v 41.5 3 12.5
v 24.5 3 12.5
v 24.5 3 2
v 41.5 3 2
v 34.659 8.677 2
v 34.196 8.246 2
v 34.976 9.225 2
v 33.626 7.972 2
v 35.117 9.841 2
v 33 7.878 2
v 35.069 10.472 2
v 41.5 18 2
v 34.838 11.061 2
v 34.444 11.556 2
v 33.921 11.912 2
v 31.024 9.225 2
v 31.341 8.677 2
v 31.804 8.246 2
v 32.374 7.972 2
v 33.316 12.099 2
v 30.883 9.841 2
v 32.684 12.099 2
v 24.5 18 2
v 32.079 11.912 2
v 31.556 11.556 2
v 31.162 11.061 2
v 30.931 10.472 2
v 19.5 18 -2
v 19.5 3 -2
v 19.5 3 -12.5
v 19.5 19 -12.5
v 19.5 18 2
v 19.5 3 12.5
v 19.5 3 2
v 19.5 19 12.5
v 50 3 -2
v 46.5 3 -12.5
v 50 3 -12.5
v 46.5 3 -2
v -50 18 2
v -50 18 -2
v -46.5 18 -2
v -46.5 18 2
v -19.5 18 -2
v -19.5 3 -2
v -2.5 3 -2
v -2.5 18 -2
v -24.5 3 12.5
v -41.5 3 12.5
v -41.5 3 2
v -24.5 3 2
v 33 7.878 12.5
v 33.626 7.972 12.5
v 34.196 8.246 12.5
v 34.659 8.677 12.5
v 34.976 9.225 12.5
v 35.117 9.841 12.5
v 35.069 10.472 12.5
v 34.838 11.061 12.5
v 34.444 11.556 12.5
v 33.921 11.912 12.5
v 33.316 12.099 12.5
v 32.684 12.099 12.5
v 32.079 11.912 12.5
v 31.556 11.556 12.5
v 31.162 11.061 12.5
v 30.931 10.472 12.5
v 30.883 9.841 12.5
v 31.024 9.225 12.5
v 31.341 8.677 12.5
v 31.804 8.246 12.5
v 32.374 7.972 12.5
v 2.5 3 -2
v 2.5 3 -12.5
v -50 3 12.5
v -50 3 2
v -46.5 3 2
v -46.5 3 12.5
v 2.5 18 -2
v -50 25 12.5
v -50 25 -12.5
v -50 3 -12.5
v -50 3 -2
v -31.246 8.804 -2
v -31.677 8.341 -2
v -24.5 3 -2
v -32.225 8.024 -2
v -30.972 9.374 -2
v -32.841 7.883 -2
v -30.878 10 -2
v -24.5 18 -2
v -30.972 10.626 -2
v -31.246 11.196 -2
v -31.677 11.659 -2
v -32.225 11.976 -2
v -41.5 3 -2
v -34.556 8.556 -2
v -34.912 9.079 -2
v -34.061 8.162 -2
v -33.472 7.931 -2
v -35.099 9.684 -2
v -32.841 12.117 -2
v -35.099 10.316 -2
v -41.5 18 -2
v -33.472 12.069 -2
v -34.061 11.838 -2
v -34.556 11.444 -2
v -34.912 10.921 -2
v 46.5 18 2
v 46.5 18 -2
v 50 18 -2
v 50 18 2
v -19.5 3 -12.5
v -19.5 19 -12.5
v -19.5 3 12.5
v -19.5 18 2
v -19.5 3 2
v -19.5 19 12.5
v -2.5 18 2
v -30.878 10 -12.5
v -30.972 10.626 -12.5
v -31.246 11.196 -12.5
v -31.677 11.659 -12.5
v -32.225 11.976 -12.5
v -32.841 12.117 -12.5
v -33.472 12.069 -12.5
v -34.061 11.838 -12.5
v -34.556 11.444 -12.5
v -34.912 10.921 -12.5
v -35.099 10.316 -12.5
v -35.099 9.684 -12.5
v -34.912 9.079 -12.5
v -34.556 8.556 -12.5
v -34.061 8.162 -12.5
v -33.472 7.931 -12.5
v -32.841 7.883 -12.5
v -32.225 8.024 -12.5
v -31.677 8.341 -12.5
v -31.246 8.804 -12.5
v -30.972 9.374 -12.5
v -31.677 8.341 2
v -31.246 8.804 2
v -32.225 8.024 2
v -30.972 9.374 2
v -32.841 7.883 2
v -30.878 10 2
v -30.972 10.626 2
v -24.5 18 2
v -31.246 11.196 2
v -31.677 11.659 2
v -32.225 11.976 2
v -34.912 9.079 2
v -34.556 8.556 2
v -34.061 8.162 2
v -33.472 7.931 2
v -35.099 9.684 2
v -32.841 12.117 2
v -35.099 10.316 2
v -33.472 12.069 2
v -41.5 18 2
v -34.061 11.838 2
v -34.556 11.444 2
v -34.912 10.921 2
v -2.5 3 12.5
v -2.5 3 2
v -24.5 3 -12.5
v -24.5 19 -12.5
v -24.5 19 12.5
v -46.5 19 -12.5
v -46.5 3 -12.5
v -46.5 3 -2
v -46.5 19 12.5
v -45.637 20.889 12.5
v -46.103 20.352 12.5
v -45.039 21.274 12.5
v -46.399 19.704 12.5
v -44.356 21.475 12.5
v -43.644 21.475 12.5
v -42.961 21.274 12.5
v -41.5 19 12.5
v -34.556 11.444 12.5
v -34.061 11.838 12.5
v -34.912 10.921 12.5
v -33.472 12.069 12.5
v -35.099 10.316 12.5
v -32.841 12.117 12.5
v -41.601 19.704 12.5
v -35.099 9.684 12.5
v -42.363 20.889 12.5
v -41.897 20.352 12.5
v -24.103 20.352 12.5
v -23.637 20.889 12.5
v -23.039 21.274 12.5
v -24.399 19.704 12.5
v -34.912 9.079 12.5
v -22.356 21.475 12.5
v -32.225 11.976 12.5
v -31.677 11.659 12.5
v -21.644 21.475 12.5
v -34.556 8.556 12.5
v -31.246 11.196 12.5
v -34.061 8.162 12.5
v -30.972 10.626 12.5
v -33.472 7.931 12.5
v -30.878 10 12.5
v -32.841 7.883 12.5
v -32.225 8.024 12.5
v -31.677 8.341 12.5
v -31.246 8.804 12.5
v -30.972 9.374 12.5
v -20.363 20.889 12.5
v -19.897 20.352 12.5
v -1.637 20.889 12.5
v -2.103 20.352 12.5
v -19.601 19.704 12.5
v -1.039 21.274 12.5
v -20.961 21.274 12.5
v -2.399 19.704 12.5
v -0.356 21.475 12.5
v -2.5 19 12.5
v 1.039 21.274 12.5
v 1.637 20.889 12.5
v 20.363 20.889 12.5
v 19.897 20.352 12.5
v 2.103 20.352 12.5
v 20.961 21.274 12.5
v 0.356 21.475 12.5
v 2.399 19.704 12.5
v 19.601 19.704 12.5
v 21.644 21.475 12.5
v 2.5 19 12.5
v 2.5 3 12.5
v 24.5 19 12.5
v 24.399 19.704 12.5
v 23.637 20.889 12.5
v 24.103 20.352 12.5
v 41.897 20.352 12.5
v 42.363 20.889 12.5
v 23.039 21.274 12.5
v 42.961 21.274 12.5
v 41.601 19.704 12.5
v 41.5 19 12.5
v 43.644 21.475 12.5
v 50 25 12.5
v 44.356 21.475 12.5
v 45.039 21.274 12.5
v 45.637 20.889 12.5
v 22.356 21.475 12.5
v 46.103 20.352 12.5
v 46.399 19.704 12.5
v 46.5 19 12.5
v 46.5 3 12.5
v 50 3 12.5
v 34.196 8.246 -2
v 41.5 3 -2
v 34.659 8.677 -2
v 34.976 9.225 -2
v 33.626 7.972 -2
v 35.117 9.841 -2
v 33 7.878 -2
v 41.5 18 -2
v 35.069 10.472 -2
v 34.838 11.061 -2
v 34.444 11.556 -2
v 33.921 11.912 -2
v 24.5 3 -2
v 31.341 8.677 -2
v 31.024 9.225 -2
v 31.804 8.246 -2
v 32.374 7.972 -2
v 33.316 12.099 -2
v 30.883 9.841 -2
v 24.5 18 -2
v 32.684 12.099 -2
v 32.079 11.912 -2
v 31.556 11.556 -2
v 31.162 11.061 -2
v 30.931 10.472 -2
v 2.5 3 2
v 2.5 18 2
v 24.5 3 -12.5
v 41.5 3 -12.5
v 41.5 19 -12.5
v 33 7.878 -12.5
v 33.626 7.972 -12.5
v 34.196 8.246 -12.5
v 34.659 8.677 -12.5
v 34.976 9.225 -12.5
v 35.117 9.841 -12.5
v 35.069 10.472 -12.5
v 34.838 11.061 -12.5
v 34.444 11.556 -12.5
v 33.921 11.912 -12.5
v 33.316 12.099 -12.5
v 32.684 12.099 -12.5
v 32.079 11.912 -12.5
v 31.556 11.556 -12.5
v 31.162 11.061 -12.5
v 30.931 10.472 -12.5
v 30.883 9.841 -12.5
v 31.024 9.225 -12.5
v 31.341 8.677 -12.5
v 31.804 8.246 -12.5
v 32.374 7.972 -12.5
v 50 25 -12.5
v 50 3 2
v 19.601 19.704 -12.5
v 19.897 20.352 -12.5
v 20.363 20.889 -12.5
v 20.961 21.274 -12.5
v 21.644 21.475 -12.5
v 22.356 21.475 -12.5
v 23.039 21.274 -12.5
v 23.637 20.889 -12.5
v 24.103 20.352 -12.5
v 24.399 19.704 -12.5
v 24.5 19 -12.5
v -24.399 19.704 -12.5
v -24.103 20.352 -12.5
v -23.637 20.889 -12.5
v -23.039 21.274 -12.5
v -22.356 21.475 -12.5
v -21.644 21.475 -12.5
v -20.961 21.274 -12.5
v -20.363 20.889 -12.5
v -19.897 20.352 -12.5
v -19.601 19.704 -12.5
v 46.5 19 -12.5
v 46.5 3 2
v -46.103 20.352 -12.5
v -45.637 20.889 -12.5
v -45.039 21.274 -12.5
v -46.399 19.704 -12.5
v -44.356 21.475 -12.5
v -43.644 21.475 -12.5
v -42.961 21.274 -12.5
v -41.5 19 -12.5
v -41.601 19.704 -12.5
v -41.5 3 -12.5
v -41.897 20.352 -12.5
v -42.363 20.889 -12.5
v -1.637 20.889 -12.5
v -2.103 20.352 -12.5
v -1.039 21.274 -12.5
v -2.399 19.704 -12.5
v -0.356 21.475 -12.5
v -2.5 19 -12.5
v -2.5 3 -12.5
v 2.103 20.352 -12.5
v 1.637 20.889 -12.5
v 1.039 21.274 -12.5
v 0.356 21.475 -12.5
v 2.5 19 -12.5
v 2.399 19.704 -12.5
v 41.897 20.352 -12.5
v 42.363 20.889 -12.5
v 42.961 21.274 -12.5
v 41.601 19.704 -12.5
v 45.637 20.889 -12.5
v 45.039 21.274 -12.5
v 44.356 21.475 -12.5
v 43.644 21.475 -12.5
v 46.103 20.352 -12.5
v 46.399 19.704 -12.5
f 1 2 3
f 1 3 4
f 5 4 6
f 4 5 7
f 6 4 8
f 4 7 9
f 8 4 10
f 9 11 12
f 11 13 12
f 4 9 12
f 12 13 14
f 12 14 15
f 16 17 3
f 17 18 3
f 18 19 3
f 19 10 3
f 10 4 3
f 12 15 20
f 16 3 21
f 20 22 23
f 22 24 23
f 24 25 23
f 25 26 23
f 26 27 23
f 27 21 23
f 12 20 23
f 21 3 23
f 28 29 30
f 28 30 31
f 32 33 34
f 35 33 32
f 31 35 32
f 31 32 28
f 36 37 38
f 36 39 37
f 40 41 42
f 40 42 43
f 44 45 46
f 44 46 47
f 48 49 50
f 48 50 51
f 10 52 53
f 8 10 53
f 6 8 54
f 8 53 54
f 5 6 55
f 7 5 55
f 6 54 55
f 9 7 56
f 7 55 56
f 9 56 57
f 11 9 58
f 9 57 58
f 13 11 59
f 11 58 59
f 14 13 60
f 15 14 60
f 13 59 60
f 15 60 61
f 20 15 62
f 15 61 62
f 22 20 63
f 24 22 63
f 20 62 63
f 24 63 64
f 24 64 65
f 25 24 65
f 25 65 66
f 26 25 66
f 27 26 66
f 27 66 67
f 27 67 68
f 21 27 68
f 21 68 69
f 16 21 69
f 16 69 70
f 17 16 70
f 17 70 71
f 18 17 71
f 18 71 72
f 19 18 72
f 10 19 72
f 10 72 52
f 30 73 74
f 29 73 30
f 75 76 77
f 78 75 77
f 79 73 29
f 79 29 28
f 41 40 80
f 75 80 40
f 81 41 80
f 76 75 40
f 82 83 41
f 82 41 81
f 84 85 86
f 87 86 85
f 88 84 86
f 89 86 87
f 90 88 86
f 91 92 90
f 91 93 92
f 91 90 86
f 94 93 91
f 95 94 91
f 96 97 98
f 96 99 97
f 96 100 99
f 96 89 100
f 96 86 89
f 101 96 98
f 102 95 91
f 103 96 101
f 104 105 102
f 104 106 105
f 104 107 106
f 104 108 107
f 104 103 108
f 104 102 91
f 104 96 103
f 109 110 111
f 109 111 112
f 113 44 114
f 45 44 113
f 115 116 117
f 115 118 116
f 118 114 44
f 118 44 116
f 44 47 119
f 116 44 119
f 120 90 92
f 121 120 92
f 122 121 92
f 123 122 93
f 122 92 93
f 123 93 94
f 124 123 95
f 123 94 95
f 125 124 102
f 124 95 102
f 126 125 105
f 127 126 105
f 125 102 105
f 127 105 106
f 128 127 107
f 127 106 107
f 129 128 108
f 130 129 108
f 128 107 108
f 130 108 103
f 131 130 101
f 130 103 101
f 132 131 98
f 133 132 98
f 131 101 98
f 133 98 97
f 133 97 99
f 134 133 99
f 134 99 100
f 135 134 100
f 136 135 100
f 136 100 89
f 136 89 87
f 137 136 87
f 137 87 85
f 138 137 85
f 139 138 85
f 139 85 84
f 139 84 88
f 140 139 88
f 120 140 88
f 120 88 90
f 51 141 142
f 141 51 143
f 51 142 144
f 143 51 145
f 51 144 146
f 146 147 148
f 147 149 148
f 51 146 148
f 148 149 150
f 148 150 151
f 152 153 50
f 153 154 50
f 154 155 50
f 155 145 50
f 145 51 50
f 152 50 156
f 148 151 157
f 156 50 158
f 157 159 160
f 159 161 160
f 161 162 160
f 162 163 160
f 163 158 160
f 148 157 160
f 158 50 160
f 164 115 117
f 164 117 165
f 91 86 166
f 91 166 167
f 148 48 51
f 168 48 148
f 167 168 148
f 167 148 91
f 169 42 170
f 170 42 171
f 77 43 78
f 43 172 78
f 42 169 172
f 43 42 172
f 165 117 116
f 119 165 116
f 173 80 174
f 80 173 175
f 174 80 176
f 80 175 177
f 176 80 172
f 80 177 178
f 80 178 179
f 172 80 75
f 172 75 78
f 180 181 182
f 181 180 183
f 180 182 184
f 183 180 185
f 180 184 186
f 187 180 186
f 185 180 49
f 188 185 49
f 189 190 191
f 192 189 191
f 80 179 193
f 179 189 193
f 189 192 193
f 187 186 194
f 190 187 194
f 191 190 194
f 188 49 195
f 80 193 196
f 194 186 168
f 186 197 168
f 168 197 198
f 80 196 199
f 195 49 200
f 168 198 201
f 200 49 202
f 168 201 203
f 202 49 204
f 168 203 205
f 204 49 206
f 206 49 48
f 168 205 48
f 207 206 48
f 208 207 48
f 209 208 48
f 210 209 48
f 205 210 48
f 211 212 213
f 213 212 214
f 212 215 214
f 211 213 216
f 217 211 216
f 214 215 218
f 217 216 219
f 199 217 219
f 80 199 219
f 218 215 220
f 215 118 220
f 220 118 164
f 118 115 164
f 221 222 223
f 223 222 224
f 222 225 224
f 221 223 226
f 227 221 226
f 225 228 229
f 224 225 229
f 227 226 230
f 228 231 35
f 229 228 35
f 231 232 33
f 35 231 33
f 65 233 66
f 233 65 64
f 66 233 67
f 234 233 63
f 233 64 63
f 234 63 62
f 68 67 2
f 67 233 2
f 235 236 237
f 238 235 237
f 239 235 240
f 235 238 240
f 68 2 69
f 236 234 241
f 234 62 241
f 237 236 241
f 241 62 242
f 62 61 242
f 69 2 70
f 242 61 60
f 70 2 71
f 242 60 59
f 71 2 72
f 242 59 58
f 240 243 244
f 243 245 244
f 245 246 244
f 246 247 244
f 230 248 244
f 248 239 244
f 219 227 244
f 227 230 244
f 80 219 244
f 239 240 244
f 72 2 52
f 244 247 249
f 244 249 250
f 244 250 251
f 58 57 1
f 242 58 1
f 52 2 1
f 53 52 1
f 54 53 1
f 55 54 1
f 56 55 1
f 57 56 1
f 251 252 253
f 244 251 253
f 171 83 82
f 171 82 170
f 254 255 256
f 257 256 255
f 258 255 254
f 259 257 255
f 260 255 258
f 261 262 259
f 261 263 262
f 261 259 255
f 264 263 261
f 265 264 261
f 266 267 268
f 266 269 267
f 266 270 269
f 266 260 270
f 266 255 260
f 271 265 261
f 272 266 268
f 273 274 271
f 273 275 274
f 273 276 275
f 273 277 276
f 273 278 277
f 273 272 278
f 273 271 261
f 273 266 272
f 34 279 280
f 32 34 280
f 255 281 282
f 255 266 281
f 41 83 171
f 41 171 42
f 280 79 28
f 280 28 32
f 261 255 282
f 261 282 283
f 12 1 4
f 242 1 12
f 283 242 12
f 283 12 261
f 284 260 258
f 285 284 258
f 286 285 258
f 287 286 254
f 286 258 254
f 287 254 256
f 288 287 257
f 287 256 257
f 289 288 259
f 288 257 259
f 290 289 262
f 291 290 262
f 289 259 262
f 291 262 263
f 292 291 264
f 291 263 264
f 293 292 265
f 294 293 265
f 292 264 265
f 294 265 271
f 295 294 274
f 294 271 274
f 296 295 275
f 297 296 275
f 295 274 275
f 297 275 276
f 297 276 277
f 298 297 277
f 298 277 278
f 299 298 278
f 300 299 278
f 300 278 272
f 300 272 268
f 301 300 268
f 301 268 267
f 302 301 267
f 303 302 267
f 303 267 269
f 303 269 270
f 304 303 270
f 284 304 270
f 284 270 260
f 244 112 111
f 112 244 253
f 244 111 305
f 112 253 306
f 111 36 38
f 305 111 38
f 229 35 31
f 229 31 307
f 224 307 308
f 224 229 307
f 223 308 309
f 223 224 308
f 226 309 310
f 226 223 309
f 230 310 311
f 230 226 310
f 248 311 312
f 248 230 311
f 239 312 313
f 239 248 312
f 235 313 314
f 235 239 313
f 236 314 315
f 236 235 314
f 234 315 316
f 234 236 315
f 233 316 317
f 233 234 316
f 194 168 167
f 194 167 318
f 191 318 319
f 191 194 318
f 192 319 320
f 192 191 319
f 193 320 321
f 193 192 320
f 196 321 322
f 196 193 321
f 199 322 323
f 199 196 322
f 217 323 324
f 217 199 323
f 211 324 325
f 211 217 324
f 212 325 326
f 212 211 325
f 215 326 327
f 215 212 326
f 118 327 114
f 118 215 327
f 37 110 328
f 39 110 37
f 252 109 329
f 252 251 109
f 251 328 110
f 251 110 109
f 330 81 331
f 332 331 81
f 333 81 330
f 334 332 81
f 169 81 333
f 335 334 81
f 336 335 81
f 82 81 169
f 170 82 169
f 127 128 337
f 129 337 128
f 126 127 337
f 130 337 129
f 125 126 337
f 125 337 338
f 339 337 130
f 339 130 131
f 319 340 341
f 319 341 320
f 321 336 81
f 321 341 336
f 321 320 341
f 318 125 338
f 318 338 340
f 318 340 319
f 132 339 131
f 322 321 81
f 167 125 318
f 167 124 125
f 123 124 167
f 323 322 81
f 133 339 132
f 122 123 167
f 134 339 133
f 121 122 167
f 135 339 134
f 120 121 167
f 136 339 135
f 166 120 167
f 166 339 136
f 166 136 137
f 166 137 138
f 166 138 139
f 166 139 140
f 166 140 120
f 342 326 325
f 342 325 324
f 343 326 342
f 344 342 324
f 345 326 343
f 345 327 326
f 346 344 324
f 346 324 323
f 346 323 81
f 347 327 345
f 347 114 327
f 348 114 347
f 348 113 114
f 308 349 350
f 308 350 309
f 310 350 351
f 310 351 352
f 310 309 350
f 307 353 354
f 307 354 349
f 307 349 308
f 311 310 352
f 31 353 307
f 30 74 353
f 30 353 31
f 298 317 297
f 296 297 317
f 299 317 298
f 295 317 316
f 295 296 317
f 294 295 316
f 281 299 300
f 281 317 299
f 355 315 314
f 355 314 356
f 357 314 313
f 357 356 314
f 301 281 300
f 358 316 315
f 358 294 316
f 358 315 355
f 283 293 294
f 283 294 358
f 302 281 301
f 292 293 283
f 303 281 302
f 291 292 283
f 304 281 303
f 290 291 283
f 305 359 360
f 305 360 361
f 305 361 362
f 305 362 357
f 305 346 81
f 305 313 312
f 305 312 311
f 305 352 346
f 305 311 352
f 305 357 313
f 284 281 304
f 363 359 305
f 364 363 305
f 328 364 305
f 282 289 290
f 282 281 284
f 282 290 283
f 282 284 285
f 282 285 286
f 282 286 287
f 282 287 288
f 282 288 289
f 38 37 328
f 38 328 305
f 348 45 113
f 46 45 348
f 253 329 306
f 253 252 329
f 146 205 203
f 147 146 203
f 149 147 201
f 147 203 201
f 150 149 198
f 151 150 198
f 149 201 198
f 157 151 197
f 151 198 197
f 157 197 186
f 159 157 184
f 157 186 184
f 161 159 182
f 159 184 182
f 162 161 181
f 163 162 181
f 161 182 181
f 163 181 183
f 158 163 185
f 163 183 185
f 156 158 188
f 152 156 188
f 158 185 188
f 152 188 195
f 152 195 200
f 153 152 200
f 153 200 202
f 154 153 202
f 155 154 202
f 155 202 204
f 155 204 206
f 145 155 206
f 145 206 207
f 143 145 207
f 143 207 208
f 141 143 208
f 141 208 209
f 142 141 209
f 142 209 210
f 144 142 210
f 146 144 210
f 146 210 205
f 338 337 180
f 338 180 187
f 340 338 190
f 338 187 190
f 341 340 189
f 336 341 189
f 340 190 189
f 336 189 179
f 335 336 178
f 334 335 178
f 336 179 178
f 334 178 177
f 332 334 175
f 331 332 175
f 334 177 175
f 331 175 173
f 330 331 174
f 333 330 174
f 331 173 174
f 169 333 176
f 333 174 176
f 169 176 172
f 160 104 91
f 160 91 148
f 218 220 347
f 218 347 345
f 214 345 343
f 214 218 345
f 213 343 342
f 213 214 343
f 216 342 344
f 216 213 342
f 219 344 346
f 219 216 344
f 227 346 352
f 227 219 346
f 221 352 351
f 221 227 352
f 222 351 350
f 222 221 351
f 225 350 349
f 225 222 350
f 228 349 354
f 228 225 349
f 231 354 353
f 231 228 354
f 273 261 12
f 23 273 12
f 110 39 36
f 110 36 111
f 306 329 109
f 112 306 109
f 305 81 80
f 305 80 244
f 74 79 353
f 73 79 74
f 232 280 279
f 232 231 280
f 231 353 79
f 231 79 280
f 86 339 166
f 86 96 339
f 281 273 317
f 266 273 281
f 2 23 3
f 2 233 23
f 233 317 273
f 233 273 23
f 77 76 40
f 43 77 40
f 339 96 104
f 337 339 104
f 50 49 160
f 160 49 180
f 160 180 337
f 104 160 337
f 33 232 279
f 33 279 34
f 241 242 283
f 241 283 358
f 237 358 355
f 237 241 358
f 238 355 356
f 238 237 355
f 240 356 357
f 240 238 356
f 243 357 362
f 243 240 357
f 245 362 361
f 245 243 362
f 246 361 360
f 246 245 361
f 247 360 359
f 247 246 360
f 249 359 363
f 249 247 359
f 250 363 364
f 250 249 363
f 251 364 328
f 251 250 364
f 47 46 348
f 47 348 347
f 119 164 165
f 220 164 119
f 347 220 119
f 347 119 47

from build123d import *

# Parameters (mm, degrees)
SKETCH1_W           = 100
SKETCH1_H           = 25
BOSS_EXTRUDE1_DEPTH = 25
CUT_EXTRUDE1_DEPTH  = 48
SKETCH3_W           = 4
SKETCH3_H           = 18
CUT_EXTRUDE2_DEPTH  = 104.832798286
SKETCH4_R           = 2.122448424
CUT_EXTRUDE3_DEPTH  = 62.23724357
SKETCH5_W           = 100
SKETCH5_H           = 3
CUT_EXTRUDE4_DEPTH  = 62.23724357


with BuildPart() as part:
    # Sketch1 → Boss-Extrude1 (new body)
    with BuildSketch(Plane(origin=(0, 0, 0), x_dir=(1, 0, 0), z_dir=(0, 1, 0))):
        Rectangle(SKETCH1_W, SKETCH1_H)
    extrude(amount=BOSS_EXTRUDE1_DEPTH)

    # Sketch2 → Cut-Extrude1 (cut)
    with BuildSketch(Plane.XY.offset(12.5)):
        with BuildLine():
            Line((-19.5, 19), (-19.5, 0))
            Line((-19.5, 0), (-24.5, 0))
            Line((-24.5, 0), (-24.5, 19))
            ThreePointArc((-24.5, 19), (-22, 21.5), (-19.5, 19))
        make_face()
        with BuildLine():
            Line((-46.5, 19), (-46.5, 0))
            Line((-46.5, 0), (-41.5, 0))
            Line((-41.5, 0), (-41.5, 19))
            ThreePointArc((-41.5, 19), (-44, 21.5), (-46.5, 19))
        make_face()
        with BuildLine():
            Line((2.5, 19), (2.5, 0))
            Line((2.5, 0), (-2.5, 0))
            Line((-2.5, 0), (-2.5, 19))
            ThreePointArc((-2.5, 19), (0, 21.5), (2.5, 19))
        make_face()
        with BuildLine():
            Line((24.5, 19), (24.5, 0))
            Line((24.5, 0), (19.5, 0))
            Line((19.5, 0), (19.5, 19))
            ThreePointArc((19.5, 19), (22, 21.5), (24.5, 19))
        make_face()
        with BuildLine():
            Line((46.5, 19), (46.5, 0))
            Line((46.5, 0), (41.5, 0))
            Line((41.5, 0), (41.5, 19))
            ThreePointArc((41.5, 19), (44, 21.5), (46.5, 19))
        make_face()
    extrude(amount=-CUT_EXTRUDE1_DEPTH, mode=Mode.SUBTRACT)

    # Sketch3 → Cut-Extrude2 (cut, through all)
    with BuildSketch(Plane.ZY.offset(50)):
        with Locations((0, 9)):
            Rectangle(SKETCH3_W, SKETCH3_H)
    extrude(amount=-CUT_EXTRUDE2_DEPTH, mode=Mode.SUBTRACT)

    # Sketch4 → Cut-Extrude3 (cut, through all)
    with BuildSketch(Plane.XY.offset(12.5)):
        with Locations((-33, 10)):
            Circle(SKETCH4_R)
        with Locations(Location((33, 10, 0), (0, 0, 270))):
            Circle(SKETCH4_R)
    extrude(amount=-CUT_EXTRUDE3_DEPTH, mode=Mode.SUBTRACT)

    # Sketch5 → Cut-Extrude4 (cut, through all)
    with BuildSketch(Plane.XY.offset(12.5)):
        with Locations((0, 1.5)):
            Rectangle(SKETCH5_W, SKETCH5_H)
    extrude(amount=-CUT_EXTRUDE4_DEPTH, mode=Mode.SUBTRACT)


solid = part.part
